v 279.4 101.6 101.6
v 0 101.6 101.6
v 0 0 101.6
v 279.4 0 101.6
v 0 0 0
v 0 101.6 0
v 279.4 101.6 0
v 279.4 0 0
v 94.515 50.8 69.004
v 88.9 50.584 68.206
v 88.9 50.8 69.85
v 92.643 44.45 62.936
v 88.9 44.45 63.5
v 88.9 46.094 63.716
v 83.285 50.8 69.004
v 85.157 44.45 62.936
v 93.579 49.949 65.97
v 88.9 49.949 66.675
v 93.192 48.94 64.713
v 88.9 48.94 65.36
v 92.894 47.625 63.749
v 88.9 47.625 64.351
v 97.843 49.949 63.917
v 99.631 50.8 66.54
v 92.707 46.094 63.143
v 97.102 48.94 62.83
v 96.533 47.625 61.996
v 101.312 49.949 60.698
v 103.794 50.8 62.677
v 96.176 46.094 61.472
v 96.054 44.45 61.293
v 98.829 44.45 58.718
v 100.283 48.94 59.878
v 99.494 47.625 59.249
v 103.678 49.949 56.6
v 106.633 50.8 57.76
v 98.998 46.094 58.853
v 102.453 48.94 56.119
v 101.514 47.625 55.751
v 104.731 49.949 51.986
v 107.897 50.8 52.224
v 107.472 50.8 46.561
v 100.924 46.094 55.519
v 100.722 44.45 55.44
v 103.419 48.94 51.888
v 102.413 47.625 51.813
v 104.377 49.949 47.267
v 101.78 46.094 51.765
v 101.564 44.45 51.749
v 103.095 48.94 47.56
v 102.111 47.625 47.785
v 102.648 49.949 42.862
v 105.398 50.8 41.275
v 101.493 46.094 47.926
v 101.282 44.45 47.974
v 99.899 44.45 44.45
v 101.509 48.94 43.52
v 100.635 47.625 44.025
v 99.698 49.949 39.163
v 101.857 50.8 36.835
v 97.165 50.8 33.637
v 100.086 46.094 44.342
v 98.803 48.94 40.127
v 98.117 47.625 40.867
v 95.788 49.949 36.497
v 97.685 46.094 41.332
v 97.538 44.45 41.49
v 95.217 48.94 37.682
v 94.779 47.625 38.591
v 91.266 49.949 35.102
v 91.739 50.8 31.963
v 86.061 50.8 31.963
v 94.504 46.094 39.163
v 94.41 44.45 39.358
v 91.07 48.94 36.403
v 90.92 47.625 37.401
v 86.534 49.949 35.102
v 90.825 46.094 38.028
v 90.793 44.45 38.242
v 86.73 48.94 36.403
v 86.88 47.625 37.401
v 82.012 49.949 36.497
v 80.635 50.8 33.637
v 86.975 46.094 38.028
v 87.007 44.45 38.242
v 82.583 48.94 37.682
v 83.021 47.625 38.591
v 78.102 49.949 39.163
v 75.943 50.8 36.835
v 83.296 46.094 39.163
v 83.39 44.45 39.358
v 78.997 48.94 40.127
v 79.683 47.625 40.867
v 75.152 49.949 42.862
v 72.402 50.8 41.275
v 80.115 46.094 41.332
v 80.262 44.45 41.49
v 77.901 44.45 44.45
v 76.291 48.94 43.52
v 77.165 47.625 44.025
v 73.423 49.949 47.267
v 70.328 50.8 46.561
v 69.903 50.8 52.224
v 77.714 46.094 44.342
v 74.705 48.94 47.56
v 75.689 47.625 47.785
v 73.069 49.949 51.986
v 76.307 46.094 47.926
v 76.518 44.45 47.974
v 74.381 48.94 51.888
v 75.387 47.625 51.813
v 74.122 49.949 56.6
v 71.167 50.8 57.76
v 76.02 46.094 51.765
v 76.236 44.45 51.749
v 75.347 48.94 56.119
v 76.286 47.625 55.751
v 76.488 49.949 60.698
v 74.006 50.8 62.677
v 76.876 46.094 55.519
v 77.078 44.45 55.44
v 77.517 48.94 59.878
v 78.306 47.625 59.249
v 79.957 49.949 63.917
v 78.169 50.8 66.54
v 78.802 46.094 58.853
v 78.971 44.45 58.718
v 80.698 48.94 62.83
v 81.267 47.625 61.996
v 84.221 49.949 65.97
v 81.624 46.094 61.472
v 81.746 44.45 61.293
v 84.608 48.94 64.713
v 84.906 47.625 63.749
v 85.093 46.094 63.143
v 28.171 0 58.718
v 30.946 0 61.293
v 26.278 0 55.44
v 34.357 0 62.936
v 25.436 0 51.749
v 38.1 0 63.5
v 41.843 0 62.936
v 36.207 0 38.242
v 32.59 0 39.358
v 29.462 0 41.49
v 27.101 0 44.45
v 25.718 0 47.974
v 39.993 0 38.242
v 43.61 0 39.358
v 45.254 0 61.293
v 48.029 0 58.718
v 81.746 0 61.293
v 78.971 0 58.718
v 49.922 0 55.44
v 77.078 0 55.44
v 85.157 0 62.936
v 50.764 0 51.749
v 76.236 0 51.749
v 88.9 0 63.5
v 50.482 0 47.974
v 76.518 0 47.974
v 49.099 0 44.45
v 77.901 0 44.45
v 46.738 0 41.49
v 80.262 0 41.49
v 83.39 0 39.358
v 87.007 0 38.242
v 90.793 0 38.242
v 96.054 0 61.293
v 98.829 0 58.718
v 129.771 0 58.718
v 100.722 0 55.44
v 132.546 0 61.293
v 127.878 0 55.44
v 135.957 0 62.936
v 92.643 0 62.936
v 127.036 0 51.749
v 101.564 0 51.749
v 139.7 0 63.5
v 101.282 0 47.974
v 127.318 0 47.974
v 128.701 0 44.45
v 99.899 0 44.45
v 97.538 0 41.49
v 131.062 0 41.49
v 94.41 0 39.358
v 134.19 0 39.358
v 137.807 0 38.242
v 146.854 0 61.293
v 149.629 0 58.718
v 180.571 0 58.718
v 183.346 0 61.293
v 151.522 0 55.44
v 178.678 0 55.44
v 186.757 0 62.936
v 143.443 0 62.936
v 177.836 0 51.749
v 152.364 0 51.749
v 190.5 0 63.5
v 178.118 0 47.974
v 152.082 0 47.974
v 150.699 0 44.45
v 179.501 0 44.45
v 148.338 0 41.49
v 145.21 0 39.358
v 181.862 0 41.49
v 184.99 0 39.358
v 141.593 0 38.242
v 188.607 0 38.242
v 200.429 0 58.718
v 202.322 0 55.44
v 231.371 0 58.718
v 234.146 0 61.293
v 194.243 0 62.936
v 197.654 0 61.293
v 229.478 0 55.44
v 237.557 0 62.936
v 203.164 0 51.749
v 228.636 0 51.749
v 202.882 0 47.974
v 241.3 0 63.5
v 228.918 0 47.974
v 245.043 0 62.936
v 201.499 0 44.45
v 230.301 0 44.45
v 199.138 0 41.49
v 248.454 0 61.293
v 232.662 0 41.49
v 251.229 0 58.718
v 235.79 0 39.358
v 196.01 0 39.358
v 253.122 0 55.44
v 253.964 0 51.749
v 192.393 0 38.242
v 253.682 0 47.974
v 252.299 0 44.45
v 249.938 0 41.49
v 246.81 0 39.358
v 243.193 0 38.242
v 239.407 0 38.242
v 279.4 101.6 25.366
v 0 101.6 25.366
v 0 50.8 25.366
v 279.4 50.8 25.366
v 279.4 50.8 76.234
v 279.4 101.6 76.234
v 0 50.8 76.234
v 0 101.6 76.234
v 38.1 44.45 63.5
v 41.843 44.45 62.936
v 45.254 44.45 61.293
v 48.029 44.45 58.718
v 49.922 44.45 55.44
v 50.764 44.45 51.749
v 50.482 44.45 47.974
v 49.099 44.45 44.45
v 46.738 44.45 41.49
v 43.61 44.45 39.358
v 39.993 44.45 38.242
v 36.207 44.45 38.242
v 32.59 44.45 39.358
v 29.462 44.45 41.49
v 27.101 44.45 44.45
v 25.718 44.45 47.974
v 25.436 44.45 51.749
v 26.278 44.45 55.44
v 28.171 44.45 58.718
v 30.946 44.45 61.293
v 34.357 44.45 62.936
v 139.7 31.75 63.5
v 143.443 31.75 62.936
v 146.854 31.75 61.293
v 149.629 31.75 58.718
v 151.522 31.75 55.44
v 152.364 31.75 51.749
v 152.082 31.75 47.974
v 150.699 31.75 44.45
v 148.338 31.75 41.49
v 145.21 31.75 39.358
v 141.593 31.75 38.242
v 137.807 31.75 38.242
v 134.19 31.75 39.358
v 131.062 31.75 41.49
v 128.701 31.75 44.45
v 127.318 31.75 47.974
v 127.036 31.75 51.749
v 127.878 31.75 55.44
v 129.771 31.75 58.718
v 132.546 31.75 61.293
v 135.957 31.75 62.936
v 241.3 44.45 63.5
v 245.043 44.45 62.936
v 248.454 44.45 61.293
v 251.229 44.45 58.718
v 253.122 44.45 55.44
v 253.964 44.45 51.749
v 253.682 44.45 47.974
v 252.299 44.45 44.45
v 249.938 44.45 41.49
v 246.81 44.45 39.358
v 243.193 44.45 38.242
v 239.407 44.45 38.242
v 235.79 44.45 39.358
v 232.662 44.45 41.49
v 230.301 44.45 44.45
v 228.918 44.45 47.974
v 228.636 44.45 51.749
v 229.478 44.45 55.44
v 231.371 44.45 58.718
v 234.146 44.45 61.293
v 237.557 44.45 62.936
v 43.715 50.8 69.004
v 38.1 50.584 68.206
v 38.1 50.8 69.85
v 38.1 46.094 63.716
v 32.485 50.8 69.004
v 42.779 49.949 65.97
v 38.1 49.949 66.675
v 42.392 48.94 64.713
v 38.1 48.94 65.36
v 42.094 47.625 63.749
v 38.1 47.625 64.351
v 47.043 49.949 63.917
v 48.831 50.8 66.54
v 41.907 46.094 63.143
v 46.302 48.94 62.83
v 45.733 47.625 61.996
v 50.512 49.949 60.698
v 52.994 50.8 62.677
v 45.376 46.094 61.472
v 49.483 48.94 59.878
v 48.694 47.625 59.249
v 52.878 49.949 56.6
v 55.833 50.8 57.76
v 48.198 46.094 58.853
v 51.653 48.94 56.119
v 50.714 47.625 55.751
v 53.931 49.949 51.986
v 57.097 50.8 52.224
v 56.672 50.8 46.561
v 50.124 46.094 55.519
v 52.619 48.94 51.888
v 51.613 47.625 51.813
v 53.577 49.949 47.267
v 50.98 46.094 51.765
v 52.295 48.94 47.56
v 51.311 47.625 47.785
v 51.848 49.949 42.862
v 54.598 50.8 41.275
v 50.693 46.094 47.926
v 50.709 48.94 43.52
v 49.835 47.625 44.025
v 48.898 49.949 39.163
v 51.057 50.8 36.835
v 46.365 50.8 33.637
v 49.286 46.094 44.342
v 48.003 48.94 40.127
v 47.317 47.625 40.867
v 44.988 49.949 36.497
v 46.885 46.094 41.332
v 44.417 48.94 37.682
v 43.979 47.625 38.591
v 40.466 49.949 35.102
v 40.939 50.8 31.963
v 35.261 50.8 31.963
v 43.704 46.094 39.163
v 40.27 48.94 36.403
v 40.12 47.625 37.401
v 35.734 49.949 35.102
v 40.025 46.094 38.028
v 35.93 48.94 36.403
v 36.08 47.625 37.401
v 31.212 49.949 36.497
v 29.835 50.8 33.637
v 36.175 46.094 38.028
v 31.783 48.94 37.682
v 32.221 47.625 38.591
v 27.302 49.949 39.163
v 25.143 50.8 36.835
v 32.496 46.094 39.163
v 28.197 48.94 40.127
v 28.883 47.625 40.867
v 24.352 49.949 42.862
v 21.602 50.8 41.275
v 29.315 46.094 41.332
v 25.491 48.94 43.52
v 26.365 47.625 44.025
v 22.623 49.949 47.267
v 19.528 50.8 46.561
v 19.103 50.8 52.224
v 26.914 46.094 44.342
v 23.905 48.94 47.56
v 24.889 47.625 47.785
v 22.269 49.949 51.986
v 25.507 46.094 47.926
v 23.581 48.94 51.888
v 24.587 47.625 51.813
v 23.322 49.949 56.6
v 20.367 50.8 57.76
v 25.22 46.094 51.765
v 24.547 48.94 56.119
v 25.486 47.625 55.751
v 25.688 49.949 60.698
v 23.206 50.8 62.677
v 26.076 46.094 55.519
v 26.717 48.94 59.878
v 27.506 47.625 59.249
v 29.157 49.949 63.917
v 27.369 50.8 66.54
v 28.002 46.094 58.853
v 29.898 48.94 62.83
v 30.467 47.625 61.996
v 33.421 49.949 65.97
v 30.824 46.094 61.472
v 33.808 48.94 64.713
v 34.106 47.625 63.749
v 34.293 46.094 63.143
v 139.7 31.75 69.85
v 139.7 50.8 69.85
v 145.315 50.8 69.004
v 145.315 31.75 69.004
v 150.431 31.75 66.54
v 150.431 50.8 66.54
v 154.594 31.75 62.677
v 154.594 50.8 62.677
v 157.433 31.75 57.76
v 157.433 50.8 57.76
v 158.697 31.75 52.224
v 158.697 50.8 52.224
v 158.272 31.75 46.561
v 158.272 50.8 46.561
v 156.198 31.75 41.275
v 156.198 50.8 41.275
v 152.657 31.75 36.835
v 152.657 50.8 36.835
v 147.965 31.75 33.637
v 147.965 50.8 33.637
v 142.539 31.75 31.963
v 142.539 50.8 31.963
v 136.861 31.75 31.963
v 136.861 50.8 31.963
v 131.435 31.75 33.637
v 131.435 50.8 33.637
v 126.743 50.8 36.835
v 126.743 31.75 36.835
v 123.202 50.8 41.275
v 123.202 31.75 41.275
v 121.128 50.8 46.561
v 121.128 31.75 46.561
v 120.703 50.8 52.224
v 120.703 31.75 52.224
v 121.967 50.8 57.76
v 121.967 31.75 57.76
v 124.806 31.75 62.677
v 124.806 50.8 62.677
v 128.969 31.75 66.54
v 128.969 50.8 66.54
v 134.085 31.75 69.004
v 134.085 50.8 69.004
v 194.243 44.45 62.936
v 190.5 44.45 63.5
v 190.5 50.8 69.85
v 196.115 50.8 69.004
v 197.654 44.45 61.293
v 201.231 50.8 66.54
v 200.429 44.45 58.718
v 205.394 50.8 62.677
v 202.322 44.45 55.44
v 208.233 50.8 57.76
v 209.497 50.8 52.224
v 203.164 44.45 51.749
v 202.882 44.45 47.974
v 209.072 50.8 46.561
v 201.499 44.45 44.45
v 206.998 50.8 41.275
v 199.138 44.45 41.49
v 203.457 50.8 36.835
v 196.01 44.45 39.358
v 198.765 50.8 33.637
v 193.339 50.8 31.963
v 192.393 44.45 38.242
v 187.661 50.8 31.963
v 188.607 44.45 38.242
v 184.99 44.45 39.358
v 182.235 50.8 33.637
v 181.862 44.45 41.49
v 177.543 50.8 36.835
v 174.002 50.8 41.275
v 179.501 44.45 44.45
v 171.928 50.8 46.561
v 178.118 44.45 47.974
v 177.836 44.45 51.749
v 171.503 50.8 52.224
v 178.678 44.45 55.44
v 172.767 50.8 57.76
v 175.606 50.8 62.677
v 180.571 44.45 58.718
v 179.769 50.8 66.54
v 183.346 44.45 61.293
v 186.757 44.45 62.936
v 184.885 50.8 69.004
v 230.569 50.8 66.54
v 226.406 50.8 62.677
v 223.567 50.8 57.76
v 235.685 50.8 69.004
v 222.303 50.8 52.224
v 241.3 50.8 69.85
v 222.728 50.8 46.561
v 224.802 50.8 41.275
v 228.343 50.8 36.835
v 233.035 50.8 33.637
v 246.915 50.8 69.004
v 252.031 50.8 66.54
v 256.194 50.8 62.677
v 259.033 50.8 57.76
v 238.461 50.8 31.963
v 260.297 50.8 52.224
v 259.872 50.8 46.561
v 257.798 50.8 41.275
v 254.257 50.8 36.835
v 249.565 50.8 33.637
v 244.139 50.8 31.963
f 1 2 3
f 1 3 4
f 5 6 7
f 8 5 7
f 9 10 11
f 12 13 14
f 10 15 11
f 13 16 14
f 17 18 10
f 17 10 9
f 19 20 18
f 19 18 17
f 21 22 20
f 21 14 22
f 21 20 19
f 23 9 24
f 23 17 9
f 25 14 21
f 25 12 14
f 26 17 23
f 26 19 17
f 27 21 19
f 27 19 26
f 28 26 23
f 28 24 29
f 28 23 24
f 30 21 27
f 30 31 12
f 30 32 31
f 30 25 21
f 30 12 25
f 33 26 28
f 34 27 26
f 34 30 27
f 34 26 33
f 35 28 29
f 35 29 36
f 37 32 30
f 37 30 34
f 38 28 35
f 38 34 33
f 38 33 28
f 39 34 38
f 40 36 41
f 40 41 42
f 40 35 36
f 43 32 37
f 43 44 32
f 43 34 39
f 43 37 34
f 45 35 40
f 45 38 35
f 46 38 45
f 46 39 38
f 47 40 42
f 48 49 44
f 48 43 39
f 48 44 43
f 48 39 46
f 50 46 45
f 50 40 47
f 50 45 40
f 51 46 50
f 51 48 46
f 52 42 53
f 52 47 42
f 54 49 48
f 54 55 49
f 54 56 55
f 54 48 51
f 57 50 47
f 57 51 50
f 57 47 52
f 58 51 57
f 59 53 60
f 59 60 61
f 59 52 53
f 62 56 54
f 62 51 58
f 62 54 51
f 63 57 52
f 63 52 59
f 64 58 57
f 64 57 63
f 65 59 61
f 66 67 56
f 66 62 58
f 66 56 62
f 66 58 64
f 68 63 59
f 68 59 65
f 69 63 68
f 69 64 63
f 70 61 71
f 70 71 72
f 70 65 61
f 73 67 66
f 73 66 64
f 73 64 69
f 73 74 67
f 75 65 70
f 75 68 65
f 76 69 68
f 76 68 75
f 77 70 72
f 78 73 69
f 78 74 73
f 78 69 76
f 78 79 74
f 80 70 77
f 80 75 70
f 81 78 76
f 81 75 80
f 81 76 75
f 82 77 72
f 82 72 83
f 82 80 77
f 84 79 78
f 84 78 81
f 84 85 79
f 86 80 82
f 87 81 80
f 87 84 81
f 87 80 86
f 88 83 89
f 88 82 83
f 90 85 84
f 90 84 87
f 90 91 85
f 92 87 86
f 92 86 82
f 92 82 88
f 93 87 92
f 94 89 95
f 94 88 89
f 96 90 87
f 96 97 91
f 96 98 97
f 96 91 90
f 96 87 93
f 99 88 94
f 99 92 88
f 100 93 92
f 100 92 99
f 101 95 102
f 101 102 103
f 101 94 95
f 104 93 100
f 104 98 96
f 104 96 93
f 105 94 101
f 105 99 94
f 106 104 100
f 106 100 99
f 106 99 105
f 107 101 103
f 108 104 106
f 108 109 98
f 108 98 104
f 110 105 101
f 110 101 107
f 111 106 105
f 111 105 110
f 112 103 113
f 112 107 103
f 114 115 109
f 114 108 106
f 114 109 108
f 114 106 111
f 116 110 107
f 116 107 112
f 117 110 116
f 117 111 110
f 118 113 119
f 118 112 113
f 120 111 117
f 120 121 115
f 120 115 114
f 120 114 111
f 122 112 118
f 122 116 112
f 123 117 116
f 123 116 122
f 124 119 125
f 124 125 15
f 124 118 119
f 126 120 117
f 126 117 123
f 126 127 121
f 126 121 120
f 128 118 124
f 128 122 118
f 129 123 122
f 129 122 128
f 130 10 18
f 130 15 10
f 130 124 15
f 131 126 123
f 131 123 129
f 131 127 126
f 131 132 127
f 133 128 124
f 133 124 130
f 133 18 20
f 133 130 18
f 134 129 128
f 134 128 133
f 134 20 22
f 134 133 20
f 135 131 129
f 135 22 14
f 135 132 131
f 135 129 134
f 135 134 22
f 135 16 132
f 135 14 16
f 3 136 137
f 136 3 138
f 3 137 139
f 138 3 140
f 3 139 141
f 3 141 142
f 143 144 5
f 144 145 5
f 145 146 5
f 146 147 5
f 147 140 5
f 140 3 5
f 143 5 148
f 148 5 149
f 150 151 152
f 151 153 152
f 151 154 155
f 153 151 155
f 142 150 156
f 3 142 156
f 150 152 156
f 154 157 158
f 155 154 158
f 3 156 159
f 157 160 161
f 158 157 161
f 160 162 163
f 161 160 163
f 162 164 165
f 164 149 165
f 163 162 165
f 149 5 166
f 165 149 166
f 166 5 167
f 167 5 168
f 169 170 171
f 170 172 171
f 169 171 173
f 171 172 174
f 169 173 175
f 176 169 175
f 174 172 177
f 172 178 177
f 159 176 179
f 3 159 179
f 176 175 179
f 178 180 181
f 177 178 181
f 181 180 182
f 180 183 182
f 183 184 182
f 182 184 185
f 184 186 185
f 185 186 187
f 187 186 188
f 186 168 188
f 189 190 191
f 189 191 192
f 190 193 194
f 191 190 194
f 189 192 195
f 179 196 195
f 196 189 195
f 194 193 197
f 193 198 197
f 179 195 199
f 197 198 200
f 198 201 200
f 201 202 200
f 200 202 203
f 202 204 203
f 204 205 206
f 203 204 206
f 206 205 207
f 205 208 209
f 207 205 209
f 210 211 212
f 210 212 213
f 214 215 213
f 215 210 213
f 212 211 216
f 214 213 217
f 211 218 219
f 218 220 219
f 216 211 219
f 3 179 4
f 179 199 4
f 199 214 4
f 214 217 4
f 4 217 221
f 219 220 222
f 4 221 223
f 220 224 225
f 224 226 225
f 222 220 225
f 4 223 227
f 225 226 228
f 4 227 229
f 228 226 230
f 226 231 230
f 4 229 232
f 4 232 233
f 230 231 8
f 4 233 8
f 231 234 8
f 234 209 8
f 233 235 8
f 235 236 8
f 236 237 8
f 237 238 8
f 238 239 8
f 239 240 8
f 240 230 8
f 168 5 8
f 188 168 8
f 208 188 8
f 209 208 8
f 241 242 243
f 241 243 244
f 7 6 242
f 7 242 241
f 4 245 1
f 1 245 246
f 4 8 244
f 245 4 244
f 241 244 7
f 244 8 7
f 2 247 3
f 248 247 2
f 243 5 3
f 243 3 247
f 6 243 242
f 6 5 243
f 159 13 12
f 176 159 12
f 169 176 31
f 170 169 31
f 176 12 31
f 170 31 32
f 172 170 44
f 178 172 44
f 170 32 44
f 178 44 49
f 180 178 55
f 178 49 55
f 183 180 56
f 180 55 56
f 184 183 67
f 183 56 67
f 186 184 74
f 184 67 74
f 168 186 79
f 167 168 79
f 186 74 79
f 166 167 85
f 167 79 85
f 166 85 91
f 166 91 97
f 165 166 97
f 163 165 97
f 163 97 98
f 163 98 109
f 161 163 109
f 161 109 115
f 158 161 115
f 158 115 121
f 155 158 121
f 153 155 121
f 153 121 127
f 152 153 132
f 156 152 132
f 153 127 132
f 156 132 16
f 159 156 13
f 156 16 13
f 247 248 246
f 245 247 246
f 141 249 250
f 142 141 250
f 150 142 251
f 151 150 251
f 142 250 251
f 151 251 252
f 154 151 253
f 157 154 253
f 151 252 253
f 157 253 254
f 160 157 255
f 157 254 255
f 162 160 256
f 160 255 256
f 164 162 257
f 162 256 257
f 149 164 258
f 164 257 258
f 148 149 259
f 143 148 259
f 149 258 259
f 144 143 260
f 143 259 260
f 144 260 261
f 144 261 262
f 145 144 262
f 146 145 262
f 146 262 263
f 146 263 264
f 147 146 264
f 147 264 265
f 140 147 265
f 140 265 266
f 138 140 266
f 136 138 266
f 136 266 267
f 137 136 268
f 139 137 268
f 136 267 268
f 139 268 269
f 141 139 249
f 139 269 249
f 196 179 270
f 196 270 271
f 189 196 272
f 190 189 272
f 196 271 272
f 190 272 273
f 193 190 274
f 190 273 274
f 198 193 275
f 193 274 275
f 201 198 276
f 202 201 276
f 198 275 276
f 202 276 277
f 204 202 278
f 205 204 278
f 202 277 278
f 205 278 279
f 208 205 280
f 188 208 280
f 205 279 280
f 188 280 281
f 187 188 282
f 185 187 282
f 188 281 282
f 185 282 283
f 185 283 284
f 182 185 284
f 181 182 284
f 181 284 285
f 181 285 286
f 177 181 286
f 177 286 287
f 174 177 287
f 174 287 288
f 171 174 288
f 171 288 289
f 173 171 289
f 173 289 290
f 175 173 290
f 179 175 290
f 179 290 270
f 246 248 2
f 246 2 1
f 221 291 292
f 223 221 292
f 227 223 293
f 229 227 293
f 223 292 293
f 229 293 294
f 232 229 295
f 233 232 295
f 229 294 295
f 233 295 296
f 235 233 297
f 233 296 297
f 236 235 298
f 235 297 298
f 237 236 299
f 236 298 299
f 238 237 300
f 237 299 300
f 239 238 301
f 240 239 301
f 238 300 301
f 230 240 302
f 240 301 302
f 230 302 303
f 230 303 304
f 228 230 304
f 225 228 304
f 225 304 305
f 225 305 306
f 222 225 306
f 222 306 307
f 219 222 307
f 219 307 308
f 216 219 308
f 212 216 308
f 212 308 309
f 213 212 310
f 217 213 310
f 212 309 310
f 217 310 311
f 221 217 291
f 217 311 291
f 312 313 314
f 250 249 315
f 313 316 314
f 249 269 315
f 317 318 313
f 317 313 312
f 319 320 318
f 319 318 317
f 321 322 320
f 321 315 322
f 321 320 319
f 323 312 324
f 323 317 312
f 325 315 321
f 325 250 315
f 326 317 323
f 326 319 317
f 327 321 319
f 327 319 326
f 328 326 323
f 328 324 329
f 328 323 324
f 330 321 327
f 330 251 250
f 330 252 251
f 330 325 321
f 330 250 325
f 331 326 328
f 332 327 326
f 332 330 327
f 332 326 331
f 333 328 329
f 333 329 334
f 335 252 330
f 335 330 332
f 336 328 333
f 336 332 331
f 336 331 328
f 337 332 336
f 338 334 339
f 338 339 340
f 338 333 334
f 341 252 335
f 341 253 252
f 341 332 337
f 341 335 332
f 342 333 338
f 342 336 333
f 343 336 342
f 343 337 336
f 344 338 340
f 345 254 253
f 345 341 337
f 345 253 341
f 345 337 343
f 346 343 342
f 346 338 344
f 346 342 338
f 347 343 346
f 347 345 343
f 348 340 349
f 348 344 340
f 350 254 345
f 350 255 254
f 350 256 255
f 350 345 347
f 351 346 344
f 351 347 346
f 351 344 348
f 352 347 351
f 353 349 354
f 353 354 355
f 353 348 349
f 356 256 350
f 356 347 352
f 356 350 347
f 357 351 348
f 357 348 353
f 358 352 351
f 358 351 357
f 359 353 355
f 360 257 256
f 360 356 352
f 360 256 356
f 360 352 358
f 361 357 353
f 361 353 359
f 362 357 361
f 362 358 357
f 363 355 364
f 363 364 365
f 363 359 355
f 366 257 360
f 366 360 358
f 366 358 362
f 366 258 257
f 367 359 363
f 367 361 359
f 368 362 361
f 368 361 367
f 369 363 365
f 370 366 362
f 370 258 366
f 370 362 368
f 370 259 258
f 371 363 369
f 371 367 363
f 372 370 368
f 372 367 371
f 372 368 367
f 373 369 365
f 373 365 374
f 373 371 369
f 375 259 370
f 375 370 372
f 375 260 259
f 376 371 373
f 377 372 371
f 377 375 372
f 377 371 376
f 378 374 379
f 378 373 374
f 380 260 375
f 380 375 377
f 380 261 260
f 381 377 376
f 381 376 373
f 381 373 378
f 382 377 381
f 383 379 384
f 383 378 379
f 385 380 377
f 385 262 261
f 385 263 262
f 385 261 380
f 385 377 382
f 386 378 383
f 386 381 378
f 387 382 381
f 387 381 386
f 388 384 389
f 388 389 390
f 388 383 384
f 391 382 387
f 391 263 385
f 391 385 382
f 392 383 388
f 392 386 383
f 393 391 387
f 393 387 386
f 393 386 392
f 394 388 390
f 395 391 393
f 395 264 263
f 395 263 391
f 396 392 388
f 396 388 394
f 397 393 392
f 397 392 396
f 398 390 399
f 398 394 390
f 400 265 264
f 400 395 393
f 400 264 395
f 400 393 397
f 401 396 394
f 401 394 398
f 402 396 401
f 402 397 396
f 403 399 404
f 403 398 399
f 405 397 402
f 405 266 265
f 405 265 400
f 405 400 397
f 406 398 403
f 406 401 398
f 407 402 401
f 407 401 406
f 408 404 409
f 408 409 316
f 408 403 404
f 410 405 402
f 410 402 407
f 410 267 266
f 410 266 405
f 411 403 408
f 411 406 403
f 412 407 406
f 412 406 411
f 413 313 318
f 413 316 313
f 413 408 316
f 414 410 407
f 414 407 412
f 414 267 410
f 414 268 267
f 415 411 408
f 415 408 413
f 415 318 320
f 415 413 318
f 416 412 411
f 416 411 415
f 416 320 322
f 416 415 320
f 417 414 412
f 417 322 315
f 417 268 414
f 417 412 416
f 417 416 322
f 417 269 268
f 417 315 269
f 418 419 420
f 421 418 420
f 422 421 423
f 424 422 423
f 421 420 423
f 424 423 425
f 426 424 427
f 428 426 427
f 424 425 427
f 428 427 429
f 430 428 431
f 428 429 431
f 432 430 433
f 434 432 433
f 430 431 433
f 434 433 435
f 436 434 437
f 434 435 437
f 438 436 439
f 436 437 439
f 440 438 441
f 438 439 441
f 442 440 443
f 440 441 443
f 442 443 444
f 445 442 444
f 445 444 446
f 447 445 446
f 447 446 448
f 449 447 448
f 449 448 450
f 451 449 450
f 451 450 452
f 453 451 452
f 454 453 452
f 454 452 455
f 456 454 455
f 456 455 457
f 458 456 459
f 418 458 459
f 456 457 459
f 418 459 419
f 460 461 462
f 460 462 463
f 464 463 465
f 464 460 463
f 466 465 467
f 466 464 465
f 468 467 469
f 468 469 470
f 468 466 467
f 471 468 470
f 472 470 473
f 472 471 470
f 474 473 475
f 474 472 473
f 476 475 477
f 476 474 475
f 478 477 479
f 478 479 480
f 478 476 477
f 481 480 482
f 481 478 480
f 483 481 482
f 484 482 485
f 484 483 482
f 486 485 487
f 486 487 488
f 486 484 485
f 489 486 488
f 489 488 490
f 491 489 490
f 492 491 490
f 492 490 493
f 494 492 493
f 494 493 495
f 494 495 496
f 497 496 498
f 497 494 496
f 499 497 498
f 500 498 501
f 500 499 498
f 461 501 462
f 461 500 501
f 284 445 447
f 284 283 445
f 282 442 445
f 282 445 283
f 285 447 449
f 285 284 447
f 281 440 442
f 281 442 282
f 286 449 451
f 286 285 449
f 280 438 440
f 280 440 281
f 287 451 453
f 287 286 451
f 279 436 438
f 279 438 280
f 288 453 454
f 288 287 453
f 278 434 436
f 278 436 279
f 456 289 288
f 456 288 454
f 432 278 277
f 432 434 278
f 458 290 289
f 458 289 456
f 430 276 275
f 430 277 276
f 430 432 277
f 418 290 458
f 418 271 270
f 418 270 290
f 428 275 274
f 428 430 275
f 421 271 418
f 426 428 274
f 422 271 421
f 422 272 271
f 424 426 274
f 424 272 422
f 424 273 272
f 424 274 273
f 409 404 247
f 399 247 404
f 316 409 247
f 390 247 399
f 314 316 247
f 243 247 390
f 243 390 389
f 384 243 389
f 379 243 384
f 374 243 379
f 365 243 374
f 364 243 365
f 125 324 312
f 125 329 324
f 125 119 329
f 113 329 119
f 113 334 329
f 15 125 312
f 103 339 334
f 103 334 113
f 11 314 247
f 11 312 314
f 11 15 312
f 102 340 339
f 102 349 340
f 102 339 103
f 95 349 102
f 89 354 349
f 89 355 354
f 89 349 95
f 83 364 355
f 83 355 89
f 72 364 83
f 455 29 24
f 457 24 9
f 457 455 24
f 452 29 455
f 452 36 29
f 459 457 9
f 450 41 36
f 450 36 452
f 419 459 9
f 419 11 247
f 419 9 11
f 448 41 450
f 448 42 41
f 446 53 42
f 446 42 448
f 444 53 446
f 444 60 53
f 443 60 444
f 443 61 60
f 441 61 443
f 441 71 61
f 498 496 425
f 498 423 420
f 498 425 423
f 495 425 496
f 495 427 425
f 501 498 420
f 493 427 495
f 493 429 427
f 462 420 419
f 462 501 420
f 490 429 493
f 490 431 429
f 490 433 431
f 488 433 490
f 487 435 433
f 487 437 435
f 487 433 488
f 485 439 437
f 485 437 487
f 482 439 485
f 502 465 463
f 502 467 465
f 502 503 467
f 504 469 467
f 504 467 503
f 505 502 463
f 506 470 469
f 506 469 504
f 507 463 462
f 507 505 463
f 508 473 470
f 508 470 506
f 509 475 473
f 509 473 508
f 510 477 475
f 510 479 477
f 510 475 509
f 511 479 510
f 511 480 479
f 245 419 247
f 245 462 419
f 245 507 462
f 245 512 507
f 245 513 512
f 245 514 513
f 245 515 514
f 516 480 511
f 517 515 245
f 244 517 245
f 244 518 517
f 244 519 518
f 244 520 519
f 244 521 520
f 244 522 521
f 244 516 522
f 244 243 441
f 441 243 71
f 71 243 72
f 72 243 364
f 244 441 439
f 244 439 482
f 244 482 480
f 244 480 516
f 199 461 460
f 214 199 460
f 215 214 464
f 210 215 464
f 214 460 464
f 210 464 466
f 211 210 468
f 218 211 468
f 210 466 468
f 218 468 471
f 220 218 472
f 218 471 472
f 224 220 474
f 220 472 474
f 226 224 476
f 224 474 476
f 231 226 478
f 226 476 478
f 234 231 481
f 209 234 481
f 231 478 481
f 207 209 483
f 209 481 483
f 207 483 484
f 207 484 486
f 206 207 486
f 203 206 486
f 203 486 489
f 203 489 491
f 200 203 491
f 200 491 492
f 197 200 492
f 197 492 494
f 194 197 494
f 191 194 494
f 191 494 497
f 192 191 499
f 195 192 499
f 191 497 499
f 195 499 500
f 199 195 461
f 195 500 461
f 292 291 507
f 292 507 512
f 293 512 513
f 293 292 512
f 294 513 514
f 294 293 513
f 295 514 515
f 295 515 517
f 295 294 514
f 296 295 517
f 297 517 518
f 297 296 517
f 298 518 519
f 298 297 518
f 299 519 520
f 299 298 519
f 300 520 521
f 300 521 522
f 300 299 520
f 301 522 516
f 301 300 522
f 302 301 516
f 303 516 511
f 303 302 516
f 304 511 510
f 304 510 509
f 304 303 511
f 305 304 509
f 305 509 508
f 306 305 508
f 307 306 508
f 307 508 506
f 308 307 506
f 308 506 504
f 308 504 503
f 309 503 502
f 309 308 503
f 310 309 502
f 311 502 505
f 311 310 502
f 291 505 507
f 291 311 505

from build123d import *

# Parameters (mm, degrees)
SKETCH1_W           = 279.4
SKETCH1_H           = 101.6
BOSS_EXTRUDE1_DEPTH = 101.6
SKETCH2_W           = 279.4
SKETCH2_H           = 50.868063328
CUT_EXTRUDE1_DEPTH  = 50.8
SKETCH3_R           = 12.7
CUT_EXTRUDE5_DEPTH  = 50.8
SKETCH7_R           = 19.05
CUT_EXTRUDE6_DEPTH  = 19.05
SKETCH8_R           = 12.7
CUT_EXTRUDE7_DEPTH  = 76.2
FILLET3_R           = 6.35
CHAMFER3_SIZE       = 6.35


with BuildPart() as part:
    # Sketch1 → Boss-Extrude1 (new body)
    with BuildSketch(Plane.XY):
        with Locations((139.7, 50.8)):
            Rectangle(SKETCH1_W, SKETCH1_H)
    extrude(amount=BOSS_EXTRUDE1_DEPTH)

    # Sketch2 → Cut-Extrude1 (cut)
    with BuildSketch(Plane(origin=(0, 101.6, 0), x_dir=(1, 0, 0), z_dir=(0, 1, 0))):
        with Locations((139.7, -50.8)):
            Rectangle(SKETCH2_W, SKETCH2_H)
    extrude(amount=-CUT_EXTRUDE1_DEPTH, mode=Mode.SUBTRACT)

    # Sketch3 → Cut-Extrude5 (cut)
    with BuildSketch(Plane(origin=(0, 50.8, 0), x_dir=(1, 0, 0), z_dir=(0, 1, 0))):
        with Locations(Location((38.1, -50.8, 0), (0, 0, 270))):
            Circle(SKETCH3_R)
        with Locations(Location((88.9, -50.8, 0), (0, 0, 270))):
            Circle(SKETCH3_R)
        with Locations(Location((190.5, -50.8, 0), (0, 0, 270))):
            Circle(SKETCH3_R)
        with Locations(Location((241.3, -50.8, 0), (0, 0, 270))):
            Circle(SKETCH3_R)
    extrude(amount=-CUT_EXTRUDE5_DEPTH, mode=Mode.SUBTRACT)

    # Sketch7 → Cut-Extrude6 (cut)
    with BuildSketch(Plane(origin=(0, 50.8, 0), x_dir=(1, 0, 0), z_dir=(0, 1, 0))):
        with Locations(Location((139.7, -50.8, 0), (0, 0, 270))):
            Circle(SKETCH7_R)
    extrude(amount=-CUT_EXTRUDE6_DEPTH, mode=Mode.SUBTRACT)

    # Sketch8 → Cut-Extrude7 (cut)
    with BuildSketch(Plane(origin=(0, 31.75, 0), x_dir=(1, 0, 0), z_dir=(0, 1, 0))):
        with Locations(Location((139.7, -50.8, 0), (0, 0, 270))):
            Circle(SKETCH8_R)
    extrude(amount=-CUT_EXTRUDE7_DEPTH, mode=Mode.SUBTRACT)

    # Fillet3
    fillet3_edges = [part.edges().sort_by_distance(p)[0] for p in [
        (38.1, 50.8, 38.1),
        (88.9, 50.8, 38.1),
    ]]
    fillet(fillet3_edges, radius=FILLET3_R)

    # Chamfer3
    chamfer3_edges = [part.edges().sort_by_distance(p)[0] for p in [
        (190.5, 50.8, 38.1),
        (241.3, 50.8, 38.1),
    ]]
    chamfer(chamfer3_edges, length=CHAMFER3_SIZE)


solid = part.part
